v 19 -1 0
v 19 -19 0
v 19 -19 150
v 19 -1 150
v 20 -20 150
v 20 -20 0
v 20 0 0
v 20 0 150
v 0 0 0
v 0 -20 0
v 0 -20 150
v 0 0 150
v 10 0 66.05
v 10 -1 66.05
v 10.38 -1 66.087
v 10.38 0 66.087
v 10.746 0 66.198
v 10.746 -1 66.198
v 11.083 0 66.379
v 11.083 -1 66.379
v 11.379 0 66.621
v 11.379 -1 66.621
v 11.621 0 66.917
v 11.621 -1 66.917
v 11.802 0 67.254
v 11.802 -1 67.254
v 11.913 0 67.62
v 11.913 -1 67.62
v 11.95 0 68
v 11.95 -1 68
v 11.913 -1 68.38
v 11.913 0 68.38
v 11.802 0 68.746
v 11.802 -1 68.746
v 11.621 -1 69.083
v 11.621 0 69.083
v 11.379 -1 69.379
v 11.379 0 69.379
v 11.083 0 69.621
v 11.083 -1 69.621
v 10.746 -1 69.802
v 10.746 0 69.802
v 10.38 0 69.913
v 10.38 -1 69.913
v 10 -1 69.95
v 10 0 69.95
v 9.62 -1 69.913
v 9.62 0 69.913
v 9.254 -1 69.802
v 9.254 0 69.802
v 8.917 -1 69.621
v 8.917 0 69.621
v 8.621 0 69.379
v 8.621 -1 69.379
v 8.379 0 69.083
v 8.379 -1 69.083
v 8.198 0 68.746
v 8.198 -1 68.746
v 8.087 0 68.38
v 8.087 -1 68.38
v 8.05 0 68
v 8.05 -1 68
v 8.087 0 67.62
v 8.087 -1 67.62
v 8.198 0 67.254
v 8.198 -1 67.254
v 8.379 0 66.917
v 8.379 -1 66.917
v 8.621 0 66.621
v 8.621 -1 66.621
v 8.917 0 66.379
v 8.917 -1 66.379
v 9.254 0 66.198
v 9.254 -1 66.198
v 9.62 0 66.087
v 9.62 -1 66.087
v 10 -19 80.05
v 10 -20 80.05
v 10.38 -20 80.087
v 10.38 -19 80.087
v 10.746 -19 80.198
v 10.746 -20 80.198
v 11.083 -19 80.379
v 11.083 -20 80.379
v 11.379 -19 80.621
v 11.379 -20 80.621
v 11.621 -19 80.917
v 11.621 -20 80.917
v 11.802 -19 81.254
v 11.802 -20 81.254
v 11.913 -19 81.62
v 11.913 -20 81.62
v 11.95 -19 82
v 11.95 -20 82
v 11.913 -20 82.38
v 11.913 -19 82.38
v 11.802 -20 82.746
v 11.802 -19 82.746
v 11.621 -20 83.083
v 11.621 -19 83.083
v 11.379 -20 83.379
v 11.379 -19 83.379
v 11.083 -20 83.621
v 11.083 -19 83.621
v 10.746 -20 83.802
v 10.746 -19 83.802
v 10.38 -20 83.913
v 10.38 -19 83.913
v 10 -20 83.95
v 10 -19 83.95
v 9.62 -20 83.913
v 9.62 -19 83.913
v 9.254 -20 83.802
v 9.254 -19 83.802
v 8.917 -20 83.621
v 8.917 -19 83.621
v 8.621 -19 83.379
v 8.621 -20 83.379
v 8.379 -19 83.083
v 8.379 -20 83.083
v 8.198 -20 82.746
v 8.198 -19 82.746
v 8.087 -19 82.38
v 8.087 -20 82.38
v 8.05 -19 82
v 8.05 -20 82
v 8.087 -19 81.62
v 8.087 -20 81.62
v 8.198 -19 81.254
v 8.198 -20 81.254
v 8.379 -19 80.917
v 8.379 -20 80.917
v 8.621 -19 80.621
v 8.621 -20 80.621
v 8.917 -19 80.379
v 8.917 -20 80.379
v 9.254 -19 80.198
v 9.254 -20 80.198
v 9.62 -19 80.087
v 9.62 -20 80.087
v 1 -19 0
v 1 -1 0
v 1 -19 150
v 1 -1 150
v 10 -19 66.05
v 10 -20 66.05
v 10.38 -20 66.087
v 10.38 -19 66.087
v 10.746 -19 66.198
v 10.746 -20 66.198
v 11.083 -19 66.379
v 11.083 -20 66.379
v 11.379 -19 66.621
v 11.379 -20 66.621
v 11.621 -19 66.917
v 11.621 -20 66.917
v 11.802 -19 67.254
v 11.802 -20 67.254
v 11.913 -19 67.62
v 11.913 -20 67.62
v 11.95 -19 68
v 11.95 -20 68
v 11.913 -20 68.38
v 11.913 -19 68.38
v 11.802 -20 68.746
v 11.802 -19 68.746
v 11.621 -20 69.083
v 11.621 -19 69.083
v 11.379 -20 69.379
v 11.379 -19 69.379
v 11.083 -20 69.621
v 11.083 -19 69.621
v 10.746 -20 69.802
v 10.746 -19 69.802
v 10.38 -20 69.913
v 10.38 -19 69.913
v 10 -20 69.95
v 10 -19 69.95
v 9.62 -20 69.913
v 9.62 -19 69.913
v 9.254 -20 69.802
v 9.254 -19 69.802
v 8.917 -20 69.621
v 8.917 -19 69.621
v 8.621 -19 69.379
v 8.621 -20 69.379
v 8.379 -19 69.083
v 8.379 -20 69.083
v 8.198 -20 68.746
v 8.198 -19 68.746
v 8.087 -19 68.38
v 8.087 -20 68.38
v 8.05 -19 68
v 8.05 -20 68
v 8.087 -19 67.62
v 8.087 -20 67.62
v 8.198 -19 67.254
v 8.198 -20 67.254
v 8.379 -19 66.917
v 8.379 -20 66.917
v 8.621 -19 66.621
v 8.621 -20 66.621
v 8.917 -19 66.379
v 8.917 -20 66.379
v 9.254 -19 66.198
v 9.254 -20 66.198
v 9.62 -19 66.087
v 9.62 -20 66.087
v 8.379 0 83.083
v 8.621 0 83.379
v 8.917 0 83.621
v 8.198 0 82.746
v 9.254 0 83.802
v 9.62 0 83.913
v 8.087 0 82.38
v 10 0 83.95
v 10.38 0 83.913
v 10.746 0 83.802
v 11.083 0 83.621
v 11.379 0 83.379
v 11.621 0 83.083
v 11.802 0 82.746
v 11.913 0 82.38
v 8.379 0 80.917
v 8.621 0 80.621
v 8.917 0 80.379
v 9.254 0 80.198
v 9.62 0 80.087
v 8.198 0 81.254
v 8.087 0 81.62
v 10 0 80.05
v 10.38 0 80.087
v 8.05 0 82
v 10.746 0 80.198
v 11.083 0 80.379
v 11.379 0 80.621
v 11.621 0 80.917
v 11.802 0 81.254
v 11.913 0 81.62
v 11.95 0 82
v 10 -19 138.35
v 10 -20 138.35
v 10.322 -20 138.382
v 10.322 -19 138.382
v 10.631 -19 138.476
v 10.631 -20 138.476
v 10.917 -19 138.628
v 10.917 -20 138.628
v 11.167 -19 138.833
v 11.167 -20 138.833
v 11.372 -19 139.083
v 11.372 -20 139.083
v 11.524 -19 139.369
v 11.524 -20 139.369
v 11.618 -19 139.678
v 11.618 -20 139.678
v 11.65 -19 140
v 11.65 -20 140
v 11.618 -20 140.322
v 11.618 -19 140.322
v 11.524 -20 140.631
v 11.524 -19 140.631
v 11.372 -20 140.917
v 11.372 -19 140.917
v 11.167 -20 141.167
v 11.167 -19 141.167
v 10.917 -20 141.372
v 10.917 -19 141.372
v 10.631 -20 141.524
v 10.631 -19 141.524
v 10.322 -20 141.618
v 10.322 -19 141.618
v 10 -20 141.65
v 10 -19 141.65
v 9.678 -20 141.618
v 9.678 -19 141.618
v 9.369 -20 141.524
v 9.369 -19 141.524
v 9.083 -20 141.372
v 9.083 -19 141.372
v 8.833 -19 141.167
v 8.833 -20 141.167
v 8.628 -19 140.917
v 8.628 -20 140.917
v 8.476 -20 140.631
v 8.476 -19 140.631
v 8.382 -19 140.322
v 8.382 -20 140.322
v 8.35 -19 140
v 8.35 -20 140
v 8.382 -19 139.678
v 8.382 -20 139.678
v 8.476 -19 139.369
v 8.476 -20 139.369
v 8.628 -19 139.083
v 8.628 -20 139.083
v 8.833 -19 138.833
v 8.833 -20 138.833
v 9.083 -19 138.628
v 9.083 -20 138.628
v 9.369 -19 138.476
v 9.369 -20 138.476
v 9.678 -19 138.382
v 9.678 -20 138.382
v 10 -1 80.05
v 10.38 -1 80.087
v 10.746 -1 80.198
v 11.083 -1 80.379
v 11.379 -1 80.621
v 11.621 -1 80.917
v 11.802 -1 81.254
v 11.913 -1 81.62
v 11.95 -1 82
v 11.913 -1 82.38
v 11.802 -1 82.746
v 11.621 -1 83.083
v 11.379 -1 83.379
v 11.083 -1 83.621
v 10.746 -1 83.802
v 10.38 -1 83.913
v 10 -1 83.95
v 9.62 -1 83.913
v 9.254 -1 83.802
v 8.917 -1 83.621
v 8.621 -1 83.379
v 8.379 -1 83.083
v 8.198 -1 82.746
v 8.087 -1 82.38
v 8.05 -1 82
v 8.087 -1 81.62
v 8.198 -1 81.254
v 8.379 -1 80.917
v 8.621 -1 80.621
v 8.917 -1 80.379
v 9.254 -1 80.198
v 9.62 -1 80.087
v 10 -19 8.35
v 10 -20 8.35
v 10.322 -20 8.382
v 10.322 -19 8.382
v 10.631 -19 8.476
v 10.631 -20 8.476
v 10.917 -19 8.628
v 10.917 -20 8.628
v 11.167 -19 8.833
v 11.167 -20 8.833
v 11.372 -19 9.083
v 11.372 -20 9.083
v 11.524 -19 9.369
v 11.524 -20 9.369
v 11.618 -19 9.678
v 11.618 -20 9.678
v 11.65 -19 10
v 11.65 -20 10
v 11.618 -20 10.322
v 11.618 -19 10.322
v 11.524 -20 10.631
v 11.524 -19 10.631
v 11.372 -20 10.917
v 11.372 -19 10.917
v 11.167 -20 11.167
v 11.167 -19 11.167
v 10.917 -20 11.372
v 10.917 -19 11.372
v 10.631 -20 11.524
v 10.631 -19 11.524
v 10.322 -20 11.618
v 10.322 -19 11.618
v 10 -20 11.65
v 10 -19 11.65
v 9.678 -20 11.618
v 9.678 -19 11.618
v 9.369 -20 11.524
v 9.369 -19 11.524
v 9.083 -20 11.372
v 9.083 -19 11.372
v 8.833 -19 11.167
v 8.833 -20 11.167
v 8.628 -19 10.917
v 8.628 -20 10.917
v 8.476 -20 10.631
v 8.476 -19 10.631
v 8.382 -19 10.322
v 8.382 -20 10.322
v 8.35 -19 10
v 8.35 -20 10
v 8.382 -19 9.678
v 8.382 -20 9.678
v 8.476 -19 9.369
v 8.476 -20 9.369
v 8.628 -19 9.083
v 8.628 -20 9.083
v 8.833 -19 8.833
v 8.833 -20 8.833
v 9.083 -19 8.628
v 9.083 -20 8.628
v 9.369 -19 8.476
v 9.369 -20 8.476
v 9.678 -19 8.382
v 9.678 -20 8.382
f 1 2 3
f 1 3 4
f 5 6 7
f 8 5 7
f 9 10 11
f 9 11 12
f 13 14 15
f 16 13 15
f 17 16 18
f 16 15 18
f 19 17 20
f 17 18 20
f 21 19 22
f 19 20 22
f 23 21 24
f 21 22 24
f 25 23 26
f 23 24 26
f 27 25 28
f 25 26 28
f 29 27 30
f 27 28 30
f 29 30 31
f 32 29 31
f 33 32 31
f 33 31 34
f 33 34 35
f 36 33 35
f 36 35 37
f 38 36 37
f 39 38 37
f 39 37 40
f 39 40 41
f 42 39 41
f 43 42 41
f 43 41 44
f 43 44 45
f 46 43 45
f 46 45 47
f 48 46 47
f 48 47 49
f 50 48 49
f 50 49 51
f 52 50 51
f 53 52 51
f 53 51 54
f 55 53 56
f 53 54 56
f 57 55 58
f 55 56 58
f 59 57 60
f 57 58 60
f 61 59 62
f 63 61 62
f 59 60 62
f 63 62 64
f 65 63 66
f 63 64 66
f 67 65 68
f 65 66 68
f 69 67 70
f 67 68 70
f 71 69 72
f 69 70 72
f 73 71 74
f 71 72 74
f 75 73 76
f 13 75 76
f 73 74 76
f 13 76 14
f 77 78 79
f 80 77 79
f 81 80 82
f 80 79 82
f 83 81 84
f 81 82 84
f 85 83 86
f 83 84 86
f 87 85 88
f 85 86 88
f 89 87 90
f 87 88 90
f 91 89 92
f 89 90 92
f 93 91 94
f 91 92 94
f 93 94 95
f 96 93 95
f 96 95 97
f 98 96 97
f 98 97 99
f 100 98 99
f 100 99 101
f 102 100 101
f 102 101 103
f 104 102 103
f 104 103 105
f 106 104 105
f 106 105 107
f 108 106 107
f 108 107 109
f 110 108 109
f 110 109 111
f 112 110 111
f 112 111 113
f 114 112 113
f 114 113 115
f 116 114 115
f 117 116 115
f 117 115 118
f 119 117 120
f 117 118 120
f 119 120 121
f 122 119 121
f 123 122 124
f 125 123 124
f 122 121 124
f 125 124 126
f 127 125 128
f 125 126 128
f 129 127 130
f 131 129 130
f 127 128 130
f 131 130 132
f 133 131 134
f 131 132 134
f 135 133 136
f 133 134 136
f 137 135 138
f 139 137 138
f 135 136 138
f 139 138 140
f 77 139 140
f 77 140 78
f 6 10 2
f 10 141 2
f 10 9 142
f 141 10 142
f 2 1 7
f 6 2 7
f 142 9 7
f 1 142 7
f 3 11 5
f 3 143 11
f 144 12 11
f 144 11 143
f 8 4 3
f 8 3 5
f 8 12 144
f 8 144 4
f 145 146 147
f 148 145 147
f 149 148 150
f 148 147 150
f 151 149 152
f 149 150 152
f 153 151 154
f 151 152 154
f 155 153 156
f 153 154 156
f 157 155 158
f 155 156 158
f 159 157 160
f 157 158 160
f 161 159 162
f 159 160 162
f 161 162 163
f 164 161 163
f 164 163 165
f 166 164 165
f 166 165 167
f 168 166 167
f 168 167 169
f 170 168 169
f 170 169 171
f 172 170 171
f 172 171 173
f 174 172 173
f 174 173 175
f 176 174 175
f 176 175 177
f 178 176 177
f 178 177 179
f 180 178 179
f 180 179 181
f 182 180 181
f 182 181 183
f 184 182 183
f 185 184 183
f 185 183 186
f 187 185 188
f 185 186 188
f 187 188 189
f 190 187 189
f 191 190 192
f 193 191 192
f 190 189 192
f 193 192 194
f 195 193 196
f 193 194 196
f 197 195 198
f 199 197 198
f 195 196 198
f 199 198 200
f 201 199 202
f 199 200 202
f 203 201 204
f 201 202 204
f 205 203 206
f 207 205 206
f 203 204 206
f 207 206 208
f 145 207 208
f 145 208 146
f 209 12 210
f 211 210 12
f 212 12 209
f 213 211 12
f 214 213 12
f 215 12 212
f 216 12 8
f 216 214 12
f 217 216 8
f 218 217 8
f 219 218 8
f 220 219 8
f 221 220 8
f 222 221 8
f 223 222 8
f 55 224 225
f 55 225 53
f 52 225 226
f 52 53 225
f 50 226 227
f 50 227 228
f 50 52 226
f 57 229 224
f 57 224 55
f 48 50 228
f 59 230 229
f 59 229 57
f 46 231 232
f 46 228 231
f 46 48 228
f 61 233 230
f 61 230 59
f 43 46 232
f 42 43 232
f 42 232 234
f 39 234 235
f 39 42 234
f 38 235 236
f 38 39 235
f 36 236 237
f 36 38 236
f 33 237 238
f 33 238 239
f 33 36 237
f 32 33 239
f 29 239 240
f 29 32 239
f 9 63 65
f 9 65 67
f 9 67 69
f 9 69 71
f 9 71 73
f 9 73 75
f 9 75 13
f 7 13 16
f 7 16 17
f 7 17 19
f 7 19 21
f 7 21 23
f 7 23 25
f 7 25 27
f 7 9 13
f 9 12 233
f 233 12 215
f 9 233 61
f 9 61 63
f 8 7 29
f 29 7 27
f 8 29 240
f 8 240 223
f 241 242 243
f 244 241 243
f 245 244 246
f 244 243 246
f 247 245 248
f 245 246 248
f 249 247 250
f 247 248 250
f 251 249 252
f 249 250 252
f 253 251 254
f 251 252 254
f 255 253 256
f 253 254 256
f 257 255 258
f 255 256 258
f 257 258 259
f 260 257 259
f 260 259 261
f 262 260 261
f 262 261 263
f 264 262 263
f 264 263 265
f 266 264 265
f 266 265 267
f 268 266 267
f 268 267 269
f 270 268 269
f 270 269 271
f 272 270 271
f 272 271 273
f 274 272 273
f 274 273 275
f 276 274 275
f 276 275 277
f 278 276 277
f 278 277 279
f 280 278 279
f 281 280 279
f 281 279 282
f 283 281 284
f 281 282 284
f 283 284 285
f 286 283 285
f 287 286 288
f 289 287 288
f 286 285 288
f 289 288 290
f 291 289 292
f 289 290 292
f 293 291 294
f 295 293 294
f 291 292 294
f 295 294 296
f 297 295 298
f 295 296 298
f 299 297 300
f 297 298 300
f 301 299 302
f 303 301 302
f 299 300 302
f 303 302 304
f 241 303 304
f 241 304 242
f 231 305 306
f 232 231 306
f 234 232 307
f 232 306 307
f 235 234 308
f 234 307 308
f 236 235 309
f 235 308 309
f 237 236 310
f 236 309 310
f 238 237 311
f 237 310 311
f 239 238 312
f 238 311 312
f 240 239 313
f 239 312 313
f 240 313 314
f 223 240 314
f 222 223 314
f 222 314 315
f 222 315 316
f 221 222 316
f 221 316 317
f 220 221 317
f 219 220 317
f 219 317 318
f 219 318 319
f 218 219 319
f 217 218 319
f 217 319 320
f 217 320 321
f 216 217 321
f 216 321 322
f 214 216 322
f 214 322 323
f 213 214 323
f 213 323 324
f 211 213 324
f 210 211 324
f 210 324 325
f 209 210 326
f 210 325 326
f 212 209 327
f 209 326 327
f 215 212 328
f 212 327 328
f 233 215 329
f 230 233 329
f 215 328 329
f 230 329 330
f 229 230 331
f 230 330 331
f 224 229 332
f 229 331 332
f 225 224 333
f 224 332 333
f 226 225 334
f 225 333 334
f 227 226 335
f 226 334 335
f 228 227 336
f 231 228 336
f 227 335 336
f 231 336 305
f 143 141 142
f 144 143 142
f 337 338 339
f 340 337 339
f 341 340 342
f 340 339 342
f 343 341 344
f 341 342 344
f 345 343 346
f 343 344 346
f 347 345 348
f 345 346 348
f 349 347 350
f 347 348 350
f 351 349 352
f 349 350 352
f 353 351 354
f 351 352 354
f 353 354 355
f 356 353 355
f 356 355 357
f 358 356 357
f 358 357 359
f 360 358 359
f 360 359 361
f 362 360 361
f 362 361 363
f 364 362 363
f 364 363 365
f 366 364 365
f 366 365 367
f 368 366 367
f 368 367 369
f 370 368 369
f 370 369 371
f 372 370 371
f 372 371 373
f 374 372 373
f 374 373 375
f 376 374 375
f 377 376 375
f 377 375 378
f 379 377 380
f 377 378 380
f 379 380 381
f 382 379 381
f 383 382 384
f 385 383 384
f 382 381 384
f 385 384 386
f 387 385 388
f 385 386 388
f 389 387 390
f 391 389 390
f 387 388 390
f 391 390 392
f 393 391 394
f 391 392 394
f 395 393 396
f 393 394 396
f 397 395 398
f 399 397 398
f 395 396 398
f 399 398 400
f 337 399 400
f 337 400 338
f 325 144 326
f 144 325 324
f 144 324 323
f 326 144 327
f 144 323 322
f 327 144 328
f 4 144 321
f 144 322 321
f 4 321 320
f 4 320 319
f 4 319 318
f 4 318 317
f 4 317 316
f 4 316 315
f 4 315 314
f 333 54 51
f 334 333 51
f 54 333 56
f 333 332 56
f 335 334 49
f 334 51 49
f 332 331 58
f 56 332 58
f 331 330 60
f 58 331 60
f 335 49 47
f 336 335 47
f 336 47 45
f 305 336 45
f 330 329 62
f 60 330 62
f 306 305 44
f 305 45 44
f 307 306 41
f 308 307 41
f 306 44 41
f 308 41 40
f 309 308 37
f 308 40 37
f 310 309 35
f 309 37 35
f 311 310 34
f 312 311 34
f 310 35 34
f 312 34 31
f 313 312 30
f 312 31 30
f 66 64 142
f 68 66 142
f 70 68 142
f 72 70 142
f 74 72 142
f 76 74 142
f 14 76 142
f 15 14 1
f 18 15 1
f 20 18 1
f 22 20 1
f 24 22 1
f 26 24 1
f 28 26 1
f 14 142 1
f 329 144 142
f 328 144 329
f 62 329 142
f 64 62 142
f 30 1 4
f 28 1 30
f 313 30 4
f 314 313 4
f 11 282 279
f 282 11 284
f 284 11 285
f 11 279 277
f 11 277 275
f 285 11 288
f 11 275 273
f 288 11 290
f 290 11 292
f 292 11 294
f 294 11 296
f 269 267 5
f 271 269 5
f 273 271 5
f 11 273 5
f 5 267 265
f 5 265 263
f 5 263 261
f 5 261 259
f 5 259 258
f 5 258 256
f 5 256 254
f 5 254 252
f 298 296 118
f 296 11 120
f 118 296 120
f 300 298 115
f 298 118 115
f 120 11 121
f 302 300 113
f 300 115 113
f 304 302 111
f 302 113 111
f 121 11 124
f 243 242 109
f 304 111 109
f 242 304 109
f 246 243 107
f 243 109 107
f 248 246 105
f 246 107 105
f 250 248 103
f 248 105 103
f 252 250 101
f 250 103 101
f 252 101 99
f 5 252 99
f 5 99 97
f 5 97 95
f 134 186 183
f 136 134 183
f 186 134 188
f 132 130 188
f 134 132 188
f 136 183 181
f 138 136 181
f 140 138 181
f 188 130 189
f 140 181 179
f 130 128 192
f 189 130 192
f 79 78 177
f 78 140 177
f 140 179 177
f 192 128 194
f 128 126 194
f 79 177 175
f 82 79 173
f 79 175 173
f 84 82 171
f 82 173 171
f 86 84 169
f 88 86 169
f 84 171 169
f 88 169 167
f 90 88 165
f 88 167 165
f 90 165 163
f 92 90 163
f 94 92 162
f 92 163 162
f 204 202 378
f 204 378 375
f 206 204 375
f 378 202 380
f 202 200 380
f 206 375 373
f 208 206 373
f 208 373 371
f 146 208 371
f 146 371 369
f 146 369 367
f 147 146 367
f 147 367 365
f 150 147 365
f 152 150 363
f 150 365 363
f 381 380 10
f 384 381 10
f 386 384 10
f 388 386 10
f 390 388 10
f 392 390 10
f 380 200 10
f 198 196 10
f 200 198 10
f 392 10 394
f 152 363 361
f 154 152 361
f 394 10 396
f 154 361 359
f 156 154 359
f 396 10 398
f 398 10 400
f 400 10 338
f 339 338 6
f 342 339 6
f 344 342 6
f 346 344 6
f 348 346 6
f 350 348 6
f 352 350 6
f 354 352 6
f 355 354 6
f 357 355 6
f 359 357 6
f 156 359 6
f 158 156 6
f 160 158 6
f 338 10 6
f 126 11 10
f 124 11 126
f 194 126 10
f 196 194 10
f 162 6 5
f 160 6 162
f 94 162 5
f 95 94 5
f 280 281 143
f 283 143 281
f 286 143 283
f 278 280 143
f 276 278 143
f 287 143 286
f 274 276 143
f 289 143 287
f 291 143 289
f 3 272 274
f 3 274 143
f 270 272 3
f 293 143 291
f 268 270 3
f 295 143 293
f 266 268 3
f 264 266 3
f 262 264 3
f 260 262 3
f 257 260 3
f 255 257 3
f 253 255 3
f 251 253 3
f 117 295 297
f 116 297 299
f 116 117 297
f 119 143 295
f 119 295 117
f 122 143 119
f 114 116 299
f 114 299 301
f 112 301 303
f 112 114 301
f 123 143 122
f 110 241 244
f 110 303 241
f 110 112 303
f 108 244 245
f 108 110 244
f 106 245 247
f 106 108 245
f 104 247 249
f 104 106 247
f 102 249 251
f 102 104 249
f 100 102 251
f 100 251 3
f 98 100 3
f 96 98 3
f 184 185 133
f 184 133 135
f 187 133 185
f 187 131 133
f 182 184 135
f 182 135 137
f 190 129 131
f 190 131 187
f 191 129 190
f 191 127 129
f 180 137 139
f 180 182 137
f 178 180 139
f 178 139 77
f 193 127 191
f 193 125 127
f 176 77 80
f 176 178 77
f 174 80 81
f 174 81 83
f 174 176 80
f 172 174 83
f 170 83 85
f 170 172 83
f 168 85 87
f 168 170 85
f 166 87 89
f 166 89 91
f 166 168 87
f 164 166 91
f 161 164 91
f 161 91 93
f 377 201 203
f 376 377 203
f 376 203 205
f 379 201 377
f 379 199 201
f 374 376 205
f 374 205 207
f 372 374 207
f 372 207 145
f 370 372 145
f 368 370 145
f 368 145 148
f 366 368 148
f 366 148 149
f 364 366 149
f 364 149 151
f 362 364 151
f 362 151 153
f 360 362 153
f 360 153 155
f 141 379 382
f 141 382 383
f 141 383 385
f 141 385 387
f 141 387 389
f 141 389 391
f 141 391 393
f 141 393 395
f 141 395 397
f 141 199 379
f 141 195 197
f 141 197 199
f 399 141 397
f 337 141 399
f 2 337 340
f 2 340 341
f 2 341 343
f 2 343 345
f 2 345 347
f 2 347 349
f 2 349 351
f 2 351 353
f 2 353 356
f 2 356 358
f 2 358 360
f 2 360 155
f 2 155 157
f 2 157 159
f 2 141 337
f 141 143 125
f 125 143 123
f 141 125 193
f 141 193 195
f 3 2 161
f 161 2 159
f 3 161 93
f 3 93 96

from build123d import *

# Parameters (mm, degrees)
SKETCH_1_W          = 20
SKETCH_1_H          = 20
SKETCH_1_W_2        = 18
SKETCH_1_H_2        = 18
EXTRUDE_1_DEPTH     = 150
SKETCH_3_R          = 1.95
CUT_EXTRUDE_2_DEPTH = 153.643375225
CUT_EXTRUDE_3_REACH = 154.643
SKETCH_4_R          = 1.65


with BuildPart() as part:
    # 草图1 → 拉伸-薄壁1 (new body)
    with BuildSketch(Plane.XY):
        with Locations((10, -10)):
            Rectangle(SKETCH_1_W, SKETCH_1_H)
        with Locations((10, -10)):
            Rectangle(SKETCH_1_W_2, SKETCH_1_H_2, mode=Mode.SUBTRACT)
    extrude(amount=EXTRUDE_1_DEPTH)

    # 草图3 → 切除-拉伸2 (cut, through all)
    with BuildSketch(Plane.XZ.offset(20)):
        with Locations(Location((10, 82, 0), (0, 0, 270))):
            Circle(SKETCH_3_R)
        with Locations(Location((10, 68, 0), (0, 0, 270))):
            Circle(SKETCH_3_R)
    extrude(amount=-CUT_EXTRUDE_2_DEPTH, mode=Mode.SUBTRACT)

    # 草图4 → 切除-拉伸3 (cut, up to next)
    with BuildSketch(Plane.XZ.offset(20), mode=Mode.PRIVATE) as cut_extrude_3_sk1:
        with Locations(Location((10, 140, 0), (0, 0, 270))):
            Circle(SKETCH_4_R)
    cut_extrude_3_tool1 = extrude(cut_extrude_3_sk1.sketch, amount=-CUT_EXTRUDE_3_REACH, mode=Mode.PRIVATE) & part.part
    # 草图4 → 切除-拉伸3 (cut, up to next)
    with BuildSketch(Plane.XZ.offset(20), mode=Mode.PRIVATE) as cut_extrude_3_sk2:
        with Locations(Location((10, 10, 0), (0, 0, 270))):
            Circle(SKETCH_4_R)
    cut_extrude_3_tool2 = extrude(cut_extrude_3_sk2.sketch, amount=-CUT_EXTRUDE_3_REACH, mode=Mode.PRIVATE) & part.part
    add(cut_extrude_3_tool1.solids().sort_by_distance((10, -20, 140))[0], mode=Mode.SUBTRACT)
    add(cut_extrude_3_tool2.solids().sort_by_distance((10, -20, 10))[0], mode=Mode.SUBTRACT)


solid = part.part
